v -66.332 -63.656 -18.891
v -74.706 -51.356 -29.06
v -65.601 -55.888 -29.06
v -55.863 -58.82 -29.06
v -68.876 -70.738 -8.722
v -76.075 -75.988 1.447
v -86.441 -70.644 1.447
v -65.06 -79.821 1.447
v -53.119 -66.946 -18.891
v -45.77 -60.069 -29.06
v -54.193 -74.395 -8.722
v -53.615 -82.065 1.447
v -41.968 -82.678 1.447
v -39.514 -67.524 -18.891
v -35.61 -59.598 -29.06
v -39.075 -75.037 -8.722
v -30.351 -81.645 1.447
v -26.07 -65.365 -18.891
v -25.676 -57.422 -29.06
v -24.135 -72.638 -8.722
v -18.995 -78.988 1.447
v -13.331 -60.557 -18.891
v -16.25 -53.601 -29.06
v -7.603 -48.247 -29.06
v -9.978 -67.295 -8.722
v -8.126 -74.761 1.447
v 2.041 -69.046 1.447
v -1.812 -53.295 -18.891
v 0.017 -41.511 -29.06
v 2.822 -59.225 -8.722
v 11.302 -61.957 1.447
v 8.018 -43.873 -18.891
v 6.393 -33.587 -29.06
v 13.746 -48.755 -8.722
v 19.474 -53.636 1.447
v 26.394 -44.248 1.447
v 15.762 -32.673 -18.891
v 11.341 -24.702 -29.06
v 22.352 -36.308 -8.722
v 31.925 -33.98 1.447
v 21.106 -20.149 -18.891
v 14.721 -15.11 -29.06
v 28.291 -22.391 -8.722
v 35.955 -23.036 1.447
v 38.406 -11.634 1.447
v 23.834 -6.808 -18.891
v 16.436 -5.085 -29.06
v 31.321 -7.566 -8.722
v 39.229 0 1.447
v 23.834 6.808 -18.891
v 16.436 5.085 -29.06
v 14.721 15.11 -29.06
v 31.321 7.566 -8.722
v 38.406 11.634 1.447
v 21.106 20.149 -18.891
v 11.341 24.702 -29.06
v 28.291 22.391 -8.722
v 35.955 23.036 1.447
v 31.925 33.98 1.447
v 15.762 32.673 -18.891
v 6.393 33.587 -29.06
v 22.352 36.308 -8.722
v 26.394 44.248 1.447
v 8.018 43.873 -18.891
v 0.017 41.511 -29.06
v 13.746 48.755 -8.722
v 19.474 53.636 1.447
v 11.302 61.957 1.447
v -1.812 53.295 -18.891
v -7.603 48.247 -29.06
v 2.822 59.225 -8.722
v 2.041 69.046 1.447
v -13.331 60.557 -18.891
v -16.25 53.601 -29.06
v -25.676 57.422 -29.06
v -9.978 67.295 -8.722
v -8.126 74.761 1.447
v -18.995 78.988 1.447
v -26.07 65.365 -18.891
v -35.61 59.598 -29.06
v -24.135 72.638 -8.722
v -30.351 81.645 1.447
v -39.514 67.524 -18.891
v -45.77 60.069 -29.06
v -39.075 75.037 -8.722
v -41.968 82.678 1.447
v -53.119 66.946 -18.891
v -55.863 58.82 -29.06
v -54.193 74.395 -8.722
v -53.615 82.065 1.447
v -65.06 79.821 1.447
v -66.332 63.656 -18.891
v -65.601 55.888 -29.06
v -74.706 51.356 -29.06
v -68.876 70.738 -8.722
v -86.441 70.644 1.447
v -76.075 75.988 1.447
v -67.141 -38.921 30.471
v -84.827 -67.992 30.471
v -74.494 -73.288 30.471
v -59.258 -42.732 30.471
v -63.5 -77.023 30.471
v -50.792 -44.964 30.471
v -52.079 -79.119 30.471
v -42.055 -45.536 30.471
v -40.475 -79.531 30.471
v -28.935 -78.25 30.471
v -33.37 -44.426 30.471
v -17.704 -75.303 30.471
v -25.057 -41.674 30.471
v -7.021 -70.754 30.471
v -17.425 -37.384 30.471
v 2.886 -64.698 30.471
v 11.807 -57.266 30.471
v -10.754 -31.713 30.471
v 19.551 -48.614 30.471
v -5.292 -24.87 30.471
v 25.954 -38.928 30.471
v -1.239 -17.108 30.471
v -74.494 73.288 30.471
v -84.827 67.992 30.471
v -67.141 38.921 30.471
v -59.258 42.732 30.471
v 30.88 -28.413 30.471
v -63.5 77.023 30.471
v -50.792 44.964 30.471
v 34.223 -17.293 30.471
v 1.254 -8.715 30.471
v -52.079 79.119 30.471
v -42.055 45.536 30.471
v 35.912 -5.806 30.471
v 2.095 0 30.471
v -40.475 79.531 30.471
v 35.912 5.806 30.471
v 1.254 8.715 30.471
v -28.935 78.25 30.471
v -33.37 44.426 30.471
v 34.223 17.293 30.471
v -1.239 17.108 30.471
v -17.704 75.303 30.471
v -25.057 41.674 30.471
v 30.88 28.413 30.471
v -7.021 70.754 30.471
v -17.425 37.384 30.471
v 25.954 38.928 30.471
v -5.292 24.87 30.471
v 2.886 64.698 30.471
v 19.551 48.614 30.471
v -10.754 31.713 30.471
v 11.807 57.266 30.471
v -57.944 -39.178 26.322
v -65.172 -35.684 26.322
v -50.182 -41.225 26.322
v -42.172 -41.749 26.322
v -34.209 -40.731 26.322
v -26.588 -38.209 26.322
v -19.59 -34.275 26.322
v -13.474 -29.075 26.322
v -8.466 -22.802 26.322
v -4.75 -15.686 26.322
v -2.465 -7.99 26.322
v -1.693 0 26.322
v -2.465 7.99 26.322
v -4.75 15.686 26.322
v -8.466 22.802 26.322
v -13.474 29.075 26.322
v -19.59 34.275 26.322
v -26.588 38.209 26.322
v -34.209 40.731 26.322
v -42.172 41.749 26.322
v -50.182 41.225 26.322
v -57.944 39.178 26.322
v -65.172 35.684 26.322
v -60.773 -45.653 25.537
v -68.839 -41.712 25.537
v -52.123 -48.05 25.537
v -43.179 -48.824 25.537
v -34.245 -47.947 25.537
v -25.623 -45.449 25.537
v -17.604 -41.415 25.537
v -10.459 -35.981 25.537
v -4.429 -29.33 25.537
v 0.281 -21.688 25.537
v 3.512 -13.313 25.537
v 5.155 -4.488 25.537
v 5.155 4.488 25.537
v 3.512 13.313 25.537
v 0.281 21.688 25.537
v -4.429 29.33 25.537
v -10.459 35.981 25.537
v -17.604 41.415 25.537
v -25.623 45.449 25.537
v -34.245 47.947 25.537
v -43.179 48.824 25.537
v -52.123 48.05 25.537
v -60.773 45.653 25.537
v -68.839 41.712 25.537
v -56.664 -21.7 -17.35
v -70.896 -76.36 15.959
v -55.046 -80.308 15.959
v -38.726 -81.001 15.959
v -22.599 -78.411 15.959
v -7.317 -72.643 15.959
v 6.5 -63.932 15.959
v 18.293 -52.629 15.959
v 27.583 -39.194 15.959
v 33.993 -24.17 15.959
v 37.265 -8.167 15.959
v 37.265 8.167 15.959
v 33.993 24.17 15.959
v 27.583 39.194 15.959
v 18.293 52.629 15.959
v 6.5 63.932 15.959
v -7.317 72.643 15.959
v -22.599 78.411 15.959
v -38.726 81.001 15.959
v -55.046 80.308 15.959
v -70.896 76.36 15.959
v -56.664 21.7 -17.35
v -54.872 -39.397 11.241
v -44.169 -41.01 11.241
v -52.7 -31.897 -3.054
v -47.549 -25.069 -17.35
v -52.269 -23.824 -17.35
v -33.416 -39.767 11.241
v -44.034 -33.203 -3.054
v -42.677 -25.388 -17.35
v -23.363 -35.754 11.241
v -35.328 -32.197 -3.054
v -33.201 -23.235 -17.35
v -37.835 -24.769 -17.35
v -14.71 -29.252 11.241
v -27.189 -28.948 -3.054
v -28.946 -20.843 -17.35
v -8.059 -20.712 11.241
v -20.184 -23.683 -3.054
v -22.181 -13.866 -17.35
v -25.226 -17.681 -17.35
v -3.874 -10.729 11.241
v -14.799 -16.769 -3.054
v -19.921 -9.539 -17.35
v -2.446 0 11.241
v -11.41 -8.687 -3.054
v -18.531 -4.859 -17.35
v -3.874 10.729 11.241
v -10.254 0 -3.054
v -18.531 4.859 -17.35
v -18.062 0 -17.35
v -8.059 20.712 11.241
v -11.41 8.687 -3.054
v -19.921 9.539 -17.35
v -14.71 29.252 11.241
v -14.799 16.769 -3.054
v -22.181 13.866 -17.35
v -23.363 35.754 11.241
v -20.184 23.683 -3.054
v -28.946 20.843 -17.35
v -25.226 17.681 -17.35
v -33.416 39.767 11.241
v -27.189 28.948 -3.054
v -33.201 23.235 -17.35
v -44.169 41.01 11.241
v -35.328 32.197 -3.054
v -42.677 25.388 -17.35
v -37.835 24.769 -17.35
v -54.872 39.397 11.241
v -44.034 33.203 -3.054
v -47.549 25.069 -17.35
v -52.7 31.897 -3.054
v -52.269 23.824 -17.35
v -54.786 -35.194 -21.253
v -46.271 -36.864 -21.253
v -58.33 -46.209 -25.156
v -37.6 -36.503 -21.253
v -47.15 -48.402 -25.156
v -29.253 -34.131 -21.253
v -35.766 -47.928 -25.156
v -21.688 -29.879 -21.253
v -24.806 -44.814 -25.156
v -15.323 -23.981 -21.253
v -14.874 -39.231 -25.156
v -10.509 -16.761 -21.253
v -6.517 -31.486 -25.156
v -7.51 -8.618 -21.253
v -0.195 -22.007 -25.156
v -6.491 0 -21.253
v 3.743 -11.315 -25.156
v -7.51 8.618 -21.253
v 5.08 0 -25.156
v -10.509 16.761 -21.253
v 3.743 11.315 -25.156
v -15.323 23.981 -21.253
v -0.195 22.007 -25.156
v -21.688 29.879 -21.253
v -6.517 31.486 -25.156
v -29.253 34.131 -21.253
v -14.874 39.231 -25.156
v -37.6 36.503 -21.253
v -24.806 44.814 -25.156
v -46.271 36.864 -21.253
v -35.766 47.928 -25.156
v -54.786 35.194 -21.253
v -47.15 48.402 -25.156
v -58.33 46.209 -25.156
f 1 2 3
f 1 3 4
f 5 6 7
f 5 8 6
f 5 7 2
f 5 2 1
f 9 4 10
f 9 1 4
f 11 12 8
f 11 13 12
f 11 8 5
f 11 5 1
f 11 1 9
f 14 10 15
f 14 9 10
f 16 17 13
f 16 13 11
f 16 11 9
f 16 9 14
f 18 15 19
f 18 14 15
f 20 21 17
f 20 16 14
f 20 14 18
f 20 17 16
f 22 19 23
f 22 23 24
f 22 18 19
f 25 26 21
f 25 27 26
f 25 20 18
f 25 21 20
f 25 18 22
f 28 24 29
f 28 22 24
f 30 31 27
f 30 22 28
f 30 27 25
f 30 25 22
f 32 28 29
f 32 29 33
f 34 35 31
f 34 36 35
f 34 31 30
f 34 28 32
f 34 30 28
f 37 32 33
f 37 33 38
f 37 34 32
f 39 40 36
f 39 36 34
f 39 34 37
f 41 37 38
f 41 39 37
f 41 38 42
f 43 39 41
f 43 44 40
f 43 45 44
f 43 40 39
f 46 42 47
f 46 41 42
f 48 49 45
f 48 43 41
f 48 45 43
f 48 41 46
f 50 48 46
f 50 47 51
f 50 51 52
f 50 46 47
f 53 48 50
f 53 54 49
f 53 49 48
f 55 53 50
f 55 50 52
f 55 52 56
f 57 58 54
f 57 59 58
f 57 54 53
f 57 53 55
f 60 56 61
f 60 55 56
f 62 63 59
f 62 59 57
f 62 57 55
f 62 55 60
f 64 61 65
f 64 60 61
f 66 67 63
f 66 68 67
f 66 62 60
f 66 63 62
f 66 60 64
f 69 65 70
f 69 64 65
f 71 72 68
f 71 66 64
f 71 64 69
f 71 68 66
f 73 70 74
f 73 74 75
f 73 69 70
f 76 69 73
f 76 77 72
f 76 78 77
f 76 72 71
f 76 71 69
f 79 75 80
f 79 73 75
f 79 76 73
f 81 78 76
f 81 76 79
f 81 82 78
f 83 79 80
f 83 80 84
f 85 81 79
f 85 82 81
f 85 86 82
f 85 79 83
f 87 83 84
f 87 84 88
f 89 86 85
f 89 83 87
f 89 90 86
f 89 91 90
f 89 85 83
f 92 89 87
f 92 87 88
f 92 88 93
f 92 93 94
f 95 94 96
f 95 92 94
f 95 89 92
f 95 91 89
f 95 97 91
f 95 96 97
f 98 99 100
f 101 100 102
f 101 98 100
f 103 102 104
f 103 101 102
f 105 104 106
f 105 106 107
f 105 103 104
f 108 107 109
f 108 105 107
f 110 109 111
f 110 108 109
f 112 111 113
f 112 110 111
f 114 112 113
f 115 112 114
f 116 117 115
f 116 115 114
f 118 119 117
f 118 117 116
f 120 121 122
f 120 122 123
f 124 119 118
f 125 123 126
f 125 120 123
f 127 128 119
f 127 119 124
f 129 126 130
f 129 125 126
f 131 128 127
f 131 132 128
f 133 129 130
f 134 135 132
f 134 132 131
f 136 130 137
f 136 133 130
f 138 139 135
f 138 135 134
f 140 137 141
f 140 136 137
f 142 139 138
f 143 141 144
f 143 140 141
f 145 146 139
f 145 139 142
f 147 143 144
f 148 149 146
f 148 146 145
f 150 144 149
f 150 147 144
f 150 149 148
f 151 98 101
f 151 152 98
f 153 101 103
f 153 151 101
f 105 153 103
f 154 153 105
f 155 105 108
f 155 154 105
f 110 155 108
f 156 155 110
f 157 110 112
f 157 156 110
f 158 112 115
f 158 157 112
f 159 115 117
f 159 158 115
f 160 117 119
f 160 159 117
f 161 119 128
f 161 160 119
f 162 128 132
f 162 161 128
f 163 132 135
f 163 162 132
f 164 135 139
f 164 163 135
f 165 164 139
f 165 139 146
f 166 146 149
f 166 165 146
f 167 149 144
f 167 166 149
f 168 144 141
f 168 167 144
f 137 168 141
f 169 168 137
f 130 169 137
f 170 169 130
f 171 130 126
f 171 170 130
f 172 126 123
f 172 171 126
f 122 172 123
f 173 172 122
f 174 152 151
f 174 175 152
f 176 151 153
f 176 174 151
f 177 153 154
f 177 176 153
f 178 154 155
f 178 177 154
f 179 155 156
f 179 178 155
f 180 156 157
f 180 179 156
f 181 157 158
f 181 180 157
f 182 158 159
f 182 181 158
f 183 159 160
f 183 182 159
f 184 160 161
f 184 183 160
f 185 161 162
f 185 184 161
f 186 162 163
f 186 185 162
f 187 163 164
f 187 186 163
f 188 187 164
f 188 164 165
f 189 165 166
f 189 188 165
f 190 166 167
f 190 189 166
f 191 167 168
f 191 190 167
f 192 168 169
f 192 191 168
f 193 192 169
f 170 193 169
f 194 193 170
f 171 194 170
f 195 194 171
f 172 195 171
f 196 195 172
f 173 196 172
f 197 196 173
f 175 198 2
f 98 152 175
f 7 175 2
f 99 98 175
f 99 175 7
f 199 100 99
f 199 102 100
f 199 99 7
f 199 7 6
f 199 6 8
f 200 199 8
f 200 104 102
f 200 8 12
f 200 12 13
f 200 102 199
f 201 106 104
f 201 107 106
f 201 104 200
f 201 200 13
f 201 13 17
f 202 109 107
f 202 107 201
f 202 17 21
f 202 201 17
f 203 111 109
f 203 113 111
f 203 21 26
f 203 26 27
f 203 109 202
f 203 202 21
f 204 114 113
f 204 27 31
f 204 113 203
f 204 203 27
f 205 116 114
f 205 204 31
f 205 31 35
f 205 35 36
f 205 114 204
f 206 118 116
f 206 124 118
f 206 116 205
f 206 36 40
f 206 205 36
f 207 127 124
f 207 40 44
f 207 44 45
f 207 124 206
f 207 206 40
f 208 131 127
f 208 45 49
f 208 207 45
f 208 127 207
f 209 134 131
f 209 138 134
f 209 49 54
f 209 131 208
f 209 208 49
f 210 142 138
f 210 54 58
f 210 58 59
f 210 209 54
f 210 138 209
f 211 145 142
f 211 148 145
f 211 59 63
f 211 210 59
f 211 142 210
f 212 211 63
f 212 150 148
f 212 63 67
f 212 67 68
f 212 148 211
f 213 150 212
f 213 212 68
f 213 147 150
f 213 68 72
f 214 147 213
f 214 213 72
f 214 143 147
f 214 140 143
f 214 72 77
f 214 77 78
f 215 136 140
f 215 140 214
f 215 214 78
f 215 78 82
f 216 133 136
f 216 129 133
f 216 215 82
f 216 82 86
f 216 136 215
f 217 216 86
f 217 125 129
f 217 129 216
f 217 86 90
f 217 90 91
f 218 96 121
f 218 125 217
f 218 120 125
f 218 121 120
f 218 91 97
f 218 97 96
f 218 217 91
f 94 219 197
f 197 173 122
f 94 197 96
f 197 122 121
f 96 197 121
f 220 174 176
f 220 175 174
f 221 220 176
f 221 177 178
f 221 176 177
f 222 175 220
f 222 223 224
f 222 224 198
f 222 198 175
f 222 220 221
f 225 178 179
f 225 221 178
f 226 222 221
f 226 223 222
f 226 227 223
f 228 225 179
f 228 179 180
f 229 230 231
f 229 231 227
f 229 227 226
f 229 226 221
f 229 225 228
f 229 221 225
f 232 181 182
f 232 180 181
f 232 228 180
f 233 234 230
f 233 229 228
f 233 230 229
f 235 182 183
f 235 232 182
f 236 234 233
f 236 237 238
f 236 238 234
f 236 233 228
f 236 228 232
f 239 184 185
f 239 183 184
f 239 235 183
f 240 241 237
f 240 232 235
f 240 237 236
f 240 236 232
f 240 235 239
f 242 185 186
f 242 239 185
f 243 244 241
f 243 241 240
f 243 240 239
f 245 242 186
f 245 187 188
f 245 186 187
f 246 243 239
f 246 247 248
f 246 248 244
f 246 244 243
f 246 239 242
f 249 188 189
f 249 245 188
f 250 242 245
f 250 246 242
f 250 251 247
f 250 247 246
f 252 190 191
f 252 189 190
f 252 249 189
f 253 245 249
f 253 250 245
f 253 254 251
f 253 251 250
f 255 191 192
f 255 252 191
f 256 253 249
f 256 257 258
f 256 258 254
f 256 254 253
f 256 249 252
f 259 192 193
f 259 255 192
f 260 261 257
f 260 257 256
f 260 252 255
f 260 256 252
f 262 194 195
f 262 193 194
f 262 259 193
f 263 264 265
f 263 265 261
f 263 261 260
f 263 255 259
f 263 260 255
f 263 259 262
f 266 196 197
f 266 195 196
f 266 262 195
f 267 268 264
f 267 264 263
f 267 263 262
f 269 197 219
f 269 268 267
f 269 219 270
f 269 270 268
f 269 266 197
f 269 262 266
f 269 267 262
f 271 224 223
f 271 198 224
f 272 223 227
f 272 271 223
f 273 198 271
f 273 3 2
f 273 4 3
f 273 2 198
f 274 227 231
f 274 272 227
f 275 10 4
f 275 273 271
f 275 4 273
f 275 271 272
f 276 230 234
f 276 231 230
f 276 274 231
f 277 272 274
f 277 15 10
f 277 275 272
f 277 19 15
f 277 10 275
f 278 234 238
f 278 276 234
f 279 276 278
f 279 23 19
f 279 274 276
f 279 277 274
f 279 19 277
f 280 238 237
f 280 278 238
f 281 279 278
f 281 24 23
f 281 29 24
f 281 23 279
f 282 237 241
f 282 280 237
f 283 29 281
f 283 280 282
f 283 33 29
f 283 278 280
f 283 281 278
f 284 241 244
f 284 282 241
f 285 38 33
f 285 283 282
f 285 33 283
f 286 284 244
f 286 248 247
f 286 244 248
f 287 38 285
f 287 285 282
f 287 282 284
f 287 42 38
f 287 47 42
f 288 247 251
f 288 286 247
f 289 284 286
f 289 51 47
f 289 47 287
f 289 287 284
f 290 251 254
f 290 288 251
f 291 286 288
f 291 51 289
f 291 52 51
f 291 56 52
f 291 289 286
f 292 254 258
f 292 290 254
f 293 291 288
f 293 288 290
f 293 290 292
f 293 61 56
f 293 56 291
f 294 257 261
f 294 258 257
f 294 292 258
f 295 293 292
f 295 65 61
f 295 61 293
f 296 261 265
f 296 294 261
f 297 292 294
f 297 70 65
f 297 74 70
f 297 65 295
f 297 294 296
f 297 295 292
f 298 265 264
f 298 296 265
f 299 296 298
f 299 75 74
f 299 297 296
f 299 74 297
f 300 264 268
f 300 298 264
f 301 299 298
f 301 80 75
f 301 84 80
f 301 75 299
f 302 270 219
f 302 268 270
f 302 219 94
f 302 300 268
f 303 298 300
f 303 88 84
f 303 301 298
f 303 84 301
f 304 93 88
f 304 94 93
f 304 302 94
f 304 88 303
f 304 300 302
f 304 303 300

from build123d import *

# Parameters (mm, degrees)
F2_ANGLE = 242.631105


with BuildPart() as f2:
    # F0 (on Front) → F2 (revolve, symmetric)
    with BuildSketch(Plane.XZ) as f2_sk:
        Polygon((36.124457, 30.471444), (2.095406, 30.471444), (-1.693323, 26.322305), (5.362239, 25.53685), (-18.062208, -17.349653), (16.651124, -29.059894), (39.228894, 1.446627), align=None)
    revolve(axis=Axis((-43.462213, 0, 5.015243), (0, 0, -1)), revolution_arc=F2_ANGLE / 2)
    revolve(f2_sk.sketch, axis=Axis((-43.462213, 0, 5.015243), (0, 0, 1)), revolution_arc=F2_ANGLE / 2)


solid = f2.part
